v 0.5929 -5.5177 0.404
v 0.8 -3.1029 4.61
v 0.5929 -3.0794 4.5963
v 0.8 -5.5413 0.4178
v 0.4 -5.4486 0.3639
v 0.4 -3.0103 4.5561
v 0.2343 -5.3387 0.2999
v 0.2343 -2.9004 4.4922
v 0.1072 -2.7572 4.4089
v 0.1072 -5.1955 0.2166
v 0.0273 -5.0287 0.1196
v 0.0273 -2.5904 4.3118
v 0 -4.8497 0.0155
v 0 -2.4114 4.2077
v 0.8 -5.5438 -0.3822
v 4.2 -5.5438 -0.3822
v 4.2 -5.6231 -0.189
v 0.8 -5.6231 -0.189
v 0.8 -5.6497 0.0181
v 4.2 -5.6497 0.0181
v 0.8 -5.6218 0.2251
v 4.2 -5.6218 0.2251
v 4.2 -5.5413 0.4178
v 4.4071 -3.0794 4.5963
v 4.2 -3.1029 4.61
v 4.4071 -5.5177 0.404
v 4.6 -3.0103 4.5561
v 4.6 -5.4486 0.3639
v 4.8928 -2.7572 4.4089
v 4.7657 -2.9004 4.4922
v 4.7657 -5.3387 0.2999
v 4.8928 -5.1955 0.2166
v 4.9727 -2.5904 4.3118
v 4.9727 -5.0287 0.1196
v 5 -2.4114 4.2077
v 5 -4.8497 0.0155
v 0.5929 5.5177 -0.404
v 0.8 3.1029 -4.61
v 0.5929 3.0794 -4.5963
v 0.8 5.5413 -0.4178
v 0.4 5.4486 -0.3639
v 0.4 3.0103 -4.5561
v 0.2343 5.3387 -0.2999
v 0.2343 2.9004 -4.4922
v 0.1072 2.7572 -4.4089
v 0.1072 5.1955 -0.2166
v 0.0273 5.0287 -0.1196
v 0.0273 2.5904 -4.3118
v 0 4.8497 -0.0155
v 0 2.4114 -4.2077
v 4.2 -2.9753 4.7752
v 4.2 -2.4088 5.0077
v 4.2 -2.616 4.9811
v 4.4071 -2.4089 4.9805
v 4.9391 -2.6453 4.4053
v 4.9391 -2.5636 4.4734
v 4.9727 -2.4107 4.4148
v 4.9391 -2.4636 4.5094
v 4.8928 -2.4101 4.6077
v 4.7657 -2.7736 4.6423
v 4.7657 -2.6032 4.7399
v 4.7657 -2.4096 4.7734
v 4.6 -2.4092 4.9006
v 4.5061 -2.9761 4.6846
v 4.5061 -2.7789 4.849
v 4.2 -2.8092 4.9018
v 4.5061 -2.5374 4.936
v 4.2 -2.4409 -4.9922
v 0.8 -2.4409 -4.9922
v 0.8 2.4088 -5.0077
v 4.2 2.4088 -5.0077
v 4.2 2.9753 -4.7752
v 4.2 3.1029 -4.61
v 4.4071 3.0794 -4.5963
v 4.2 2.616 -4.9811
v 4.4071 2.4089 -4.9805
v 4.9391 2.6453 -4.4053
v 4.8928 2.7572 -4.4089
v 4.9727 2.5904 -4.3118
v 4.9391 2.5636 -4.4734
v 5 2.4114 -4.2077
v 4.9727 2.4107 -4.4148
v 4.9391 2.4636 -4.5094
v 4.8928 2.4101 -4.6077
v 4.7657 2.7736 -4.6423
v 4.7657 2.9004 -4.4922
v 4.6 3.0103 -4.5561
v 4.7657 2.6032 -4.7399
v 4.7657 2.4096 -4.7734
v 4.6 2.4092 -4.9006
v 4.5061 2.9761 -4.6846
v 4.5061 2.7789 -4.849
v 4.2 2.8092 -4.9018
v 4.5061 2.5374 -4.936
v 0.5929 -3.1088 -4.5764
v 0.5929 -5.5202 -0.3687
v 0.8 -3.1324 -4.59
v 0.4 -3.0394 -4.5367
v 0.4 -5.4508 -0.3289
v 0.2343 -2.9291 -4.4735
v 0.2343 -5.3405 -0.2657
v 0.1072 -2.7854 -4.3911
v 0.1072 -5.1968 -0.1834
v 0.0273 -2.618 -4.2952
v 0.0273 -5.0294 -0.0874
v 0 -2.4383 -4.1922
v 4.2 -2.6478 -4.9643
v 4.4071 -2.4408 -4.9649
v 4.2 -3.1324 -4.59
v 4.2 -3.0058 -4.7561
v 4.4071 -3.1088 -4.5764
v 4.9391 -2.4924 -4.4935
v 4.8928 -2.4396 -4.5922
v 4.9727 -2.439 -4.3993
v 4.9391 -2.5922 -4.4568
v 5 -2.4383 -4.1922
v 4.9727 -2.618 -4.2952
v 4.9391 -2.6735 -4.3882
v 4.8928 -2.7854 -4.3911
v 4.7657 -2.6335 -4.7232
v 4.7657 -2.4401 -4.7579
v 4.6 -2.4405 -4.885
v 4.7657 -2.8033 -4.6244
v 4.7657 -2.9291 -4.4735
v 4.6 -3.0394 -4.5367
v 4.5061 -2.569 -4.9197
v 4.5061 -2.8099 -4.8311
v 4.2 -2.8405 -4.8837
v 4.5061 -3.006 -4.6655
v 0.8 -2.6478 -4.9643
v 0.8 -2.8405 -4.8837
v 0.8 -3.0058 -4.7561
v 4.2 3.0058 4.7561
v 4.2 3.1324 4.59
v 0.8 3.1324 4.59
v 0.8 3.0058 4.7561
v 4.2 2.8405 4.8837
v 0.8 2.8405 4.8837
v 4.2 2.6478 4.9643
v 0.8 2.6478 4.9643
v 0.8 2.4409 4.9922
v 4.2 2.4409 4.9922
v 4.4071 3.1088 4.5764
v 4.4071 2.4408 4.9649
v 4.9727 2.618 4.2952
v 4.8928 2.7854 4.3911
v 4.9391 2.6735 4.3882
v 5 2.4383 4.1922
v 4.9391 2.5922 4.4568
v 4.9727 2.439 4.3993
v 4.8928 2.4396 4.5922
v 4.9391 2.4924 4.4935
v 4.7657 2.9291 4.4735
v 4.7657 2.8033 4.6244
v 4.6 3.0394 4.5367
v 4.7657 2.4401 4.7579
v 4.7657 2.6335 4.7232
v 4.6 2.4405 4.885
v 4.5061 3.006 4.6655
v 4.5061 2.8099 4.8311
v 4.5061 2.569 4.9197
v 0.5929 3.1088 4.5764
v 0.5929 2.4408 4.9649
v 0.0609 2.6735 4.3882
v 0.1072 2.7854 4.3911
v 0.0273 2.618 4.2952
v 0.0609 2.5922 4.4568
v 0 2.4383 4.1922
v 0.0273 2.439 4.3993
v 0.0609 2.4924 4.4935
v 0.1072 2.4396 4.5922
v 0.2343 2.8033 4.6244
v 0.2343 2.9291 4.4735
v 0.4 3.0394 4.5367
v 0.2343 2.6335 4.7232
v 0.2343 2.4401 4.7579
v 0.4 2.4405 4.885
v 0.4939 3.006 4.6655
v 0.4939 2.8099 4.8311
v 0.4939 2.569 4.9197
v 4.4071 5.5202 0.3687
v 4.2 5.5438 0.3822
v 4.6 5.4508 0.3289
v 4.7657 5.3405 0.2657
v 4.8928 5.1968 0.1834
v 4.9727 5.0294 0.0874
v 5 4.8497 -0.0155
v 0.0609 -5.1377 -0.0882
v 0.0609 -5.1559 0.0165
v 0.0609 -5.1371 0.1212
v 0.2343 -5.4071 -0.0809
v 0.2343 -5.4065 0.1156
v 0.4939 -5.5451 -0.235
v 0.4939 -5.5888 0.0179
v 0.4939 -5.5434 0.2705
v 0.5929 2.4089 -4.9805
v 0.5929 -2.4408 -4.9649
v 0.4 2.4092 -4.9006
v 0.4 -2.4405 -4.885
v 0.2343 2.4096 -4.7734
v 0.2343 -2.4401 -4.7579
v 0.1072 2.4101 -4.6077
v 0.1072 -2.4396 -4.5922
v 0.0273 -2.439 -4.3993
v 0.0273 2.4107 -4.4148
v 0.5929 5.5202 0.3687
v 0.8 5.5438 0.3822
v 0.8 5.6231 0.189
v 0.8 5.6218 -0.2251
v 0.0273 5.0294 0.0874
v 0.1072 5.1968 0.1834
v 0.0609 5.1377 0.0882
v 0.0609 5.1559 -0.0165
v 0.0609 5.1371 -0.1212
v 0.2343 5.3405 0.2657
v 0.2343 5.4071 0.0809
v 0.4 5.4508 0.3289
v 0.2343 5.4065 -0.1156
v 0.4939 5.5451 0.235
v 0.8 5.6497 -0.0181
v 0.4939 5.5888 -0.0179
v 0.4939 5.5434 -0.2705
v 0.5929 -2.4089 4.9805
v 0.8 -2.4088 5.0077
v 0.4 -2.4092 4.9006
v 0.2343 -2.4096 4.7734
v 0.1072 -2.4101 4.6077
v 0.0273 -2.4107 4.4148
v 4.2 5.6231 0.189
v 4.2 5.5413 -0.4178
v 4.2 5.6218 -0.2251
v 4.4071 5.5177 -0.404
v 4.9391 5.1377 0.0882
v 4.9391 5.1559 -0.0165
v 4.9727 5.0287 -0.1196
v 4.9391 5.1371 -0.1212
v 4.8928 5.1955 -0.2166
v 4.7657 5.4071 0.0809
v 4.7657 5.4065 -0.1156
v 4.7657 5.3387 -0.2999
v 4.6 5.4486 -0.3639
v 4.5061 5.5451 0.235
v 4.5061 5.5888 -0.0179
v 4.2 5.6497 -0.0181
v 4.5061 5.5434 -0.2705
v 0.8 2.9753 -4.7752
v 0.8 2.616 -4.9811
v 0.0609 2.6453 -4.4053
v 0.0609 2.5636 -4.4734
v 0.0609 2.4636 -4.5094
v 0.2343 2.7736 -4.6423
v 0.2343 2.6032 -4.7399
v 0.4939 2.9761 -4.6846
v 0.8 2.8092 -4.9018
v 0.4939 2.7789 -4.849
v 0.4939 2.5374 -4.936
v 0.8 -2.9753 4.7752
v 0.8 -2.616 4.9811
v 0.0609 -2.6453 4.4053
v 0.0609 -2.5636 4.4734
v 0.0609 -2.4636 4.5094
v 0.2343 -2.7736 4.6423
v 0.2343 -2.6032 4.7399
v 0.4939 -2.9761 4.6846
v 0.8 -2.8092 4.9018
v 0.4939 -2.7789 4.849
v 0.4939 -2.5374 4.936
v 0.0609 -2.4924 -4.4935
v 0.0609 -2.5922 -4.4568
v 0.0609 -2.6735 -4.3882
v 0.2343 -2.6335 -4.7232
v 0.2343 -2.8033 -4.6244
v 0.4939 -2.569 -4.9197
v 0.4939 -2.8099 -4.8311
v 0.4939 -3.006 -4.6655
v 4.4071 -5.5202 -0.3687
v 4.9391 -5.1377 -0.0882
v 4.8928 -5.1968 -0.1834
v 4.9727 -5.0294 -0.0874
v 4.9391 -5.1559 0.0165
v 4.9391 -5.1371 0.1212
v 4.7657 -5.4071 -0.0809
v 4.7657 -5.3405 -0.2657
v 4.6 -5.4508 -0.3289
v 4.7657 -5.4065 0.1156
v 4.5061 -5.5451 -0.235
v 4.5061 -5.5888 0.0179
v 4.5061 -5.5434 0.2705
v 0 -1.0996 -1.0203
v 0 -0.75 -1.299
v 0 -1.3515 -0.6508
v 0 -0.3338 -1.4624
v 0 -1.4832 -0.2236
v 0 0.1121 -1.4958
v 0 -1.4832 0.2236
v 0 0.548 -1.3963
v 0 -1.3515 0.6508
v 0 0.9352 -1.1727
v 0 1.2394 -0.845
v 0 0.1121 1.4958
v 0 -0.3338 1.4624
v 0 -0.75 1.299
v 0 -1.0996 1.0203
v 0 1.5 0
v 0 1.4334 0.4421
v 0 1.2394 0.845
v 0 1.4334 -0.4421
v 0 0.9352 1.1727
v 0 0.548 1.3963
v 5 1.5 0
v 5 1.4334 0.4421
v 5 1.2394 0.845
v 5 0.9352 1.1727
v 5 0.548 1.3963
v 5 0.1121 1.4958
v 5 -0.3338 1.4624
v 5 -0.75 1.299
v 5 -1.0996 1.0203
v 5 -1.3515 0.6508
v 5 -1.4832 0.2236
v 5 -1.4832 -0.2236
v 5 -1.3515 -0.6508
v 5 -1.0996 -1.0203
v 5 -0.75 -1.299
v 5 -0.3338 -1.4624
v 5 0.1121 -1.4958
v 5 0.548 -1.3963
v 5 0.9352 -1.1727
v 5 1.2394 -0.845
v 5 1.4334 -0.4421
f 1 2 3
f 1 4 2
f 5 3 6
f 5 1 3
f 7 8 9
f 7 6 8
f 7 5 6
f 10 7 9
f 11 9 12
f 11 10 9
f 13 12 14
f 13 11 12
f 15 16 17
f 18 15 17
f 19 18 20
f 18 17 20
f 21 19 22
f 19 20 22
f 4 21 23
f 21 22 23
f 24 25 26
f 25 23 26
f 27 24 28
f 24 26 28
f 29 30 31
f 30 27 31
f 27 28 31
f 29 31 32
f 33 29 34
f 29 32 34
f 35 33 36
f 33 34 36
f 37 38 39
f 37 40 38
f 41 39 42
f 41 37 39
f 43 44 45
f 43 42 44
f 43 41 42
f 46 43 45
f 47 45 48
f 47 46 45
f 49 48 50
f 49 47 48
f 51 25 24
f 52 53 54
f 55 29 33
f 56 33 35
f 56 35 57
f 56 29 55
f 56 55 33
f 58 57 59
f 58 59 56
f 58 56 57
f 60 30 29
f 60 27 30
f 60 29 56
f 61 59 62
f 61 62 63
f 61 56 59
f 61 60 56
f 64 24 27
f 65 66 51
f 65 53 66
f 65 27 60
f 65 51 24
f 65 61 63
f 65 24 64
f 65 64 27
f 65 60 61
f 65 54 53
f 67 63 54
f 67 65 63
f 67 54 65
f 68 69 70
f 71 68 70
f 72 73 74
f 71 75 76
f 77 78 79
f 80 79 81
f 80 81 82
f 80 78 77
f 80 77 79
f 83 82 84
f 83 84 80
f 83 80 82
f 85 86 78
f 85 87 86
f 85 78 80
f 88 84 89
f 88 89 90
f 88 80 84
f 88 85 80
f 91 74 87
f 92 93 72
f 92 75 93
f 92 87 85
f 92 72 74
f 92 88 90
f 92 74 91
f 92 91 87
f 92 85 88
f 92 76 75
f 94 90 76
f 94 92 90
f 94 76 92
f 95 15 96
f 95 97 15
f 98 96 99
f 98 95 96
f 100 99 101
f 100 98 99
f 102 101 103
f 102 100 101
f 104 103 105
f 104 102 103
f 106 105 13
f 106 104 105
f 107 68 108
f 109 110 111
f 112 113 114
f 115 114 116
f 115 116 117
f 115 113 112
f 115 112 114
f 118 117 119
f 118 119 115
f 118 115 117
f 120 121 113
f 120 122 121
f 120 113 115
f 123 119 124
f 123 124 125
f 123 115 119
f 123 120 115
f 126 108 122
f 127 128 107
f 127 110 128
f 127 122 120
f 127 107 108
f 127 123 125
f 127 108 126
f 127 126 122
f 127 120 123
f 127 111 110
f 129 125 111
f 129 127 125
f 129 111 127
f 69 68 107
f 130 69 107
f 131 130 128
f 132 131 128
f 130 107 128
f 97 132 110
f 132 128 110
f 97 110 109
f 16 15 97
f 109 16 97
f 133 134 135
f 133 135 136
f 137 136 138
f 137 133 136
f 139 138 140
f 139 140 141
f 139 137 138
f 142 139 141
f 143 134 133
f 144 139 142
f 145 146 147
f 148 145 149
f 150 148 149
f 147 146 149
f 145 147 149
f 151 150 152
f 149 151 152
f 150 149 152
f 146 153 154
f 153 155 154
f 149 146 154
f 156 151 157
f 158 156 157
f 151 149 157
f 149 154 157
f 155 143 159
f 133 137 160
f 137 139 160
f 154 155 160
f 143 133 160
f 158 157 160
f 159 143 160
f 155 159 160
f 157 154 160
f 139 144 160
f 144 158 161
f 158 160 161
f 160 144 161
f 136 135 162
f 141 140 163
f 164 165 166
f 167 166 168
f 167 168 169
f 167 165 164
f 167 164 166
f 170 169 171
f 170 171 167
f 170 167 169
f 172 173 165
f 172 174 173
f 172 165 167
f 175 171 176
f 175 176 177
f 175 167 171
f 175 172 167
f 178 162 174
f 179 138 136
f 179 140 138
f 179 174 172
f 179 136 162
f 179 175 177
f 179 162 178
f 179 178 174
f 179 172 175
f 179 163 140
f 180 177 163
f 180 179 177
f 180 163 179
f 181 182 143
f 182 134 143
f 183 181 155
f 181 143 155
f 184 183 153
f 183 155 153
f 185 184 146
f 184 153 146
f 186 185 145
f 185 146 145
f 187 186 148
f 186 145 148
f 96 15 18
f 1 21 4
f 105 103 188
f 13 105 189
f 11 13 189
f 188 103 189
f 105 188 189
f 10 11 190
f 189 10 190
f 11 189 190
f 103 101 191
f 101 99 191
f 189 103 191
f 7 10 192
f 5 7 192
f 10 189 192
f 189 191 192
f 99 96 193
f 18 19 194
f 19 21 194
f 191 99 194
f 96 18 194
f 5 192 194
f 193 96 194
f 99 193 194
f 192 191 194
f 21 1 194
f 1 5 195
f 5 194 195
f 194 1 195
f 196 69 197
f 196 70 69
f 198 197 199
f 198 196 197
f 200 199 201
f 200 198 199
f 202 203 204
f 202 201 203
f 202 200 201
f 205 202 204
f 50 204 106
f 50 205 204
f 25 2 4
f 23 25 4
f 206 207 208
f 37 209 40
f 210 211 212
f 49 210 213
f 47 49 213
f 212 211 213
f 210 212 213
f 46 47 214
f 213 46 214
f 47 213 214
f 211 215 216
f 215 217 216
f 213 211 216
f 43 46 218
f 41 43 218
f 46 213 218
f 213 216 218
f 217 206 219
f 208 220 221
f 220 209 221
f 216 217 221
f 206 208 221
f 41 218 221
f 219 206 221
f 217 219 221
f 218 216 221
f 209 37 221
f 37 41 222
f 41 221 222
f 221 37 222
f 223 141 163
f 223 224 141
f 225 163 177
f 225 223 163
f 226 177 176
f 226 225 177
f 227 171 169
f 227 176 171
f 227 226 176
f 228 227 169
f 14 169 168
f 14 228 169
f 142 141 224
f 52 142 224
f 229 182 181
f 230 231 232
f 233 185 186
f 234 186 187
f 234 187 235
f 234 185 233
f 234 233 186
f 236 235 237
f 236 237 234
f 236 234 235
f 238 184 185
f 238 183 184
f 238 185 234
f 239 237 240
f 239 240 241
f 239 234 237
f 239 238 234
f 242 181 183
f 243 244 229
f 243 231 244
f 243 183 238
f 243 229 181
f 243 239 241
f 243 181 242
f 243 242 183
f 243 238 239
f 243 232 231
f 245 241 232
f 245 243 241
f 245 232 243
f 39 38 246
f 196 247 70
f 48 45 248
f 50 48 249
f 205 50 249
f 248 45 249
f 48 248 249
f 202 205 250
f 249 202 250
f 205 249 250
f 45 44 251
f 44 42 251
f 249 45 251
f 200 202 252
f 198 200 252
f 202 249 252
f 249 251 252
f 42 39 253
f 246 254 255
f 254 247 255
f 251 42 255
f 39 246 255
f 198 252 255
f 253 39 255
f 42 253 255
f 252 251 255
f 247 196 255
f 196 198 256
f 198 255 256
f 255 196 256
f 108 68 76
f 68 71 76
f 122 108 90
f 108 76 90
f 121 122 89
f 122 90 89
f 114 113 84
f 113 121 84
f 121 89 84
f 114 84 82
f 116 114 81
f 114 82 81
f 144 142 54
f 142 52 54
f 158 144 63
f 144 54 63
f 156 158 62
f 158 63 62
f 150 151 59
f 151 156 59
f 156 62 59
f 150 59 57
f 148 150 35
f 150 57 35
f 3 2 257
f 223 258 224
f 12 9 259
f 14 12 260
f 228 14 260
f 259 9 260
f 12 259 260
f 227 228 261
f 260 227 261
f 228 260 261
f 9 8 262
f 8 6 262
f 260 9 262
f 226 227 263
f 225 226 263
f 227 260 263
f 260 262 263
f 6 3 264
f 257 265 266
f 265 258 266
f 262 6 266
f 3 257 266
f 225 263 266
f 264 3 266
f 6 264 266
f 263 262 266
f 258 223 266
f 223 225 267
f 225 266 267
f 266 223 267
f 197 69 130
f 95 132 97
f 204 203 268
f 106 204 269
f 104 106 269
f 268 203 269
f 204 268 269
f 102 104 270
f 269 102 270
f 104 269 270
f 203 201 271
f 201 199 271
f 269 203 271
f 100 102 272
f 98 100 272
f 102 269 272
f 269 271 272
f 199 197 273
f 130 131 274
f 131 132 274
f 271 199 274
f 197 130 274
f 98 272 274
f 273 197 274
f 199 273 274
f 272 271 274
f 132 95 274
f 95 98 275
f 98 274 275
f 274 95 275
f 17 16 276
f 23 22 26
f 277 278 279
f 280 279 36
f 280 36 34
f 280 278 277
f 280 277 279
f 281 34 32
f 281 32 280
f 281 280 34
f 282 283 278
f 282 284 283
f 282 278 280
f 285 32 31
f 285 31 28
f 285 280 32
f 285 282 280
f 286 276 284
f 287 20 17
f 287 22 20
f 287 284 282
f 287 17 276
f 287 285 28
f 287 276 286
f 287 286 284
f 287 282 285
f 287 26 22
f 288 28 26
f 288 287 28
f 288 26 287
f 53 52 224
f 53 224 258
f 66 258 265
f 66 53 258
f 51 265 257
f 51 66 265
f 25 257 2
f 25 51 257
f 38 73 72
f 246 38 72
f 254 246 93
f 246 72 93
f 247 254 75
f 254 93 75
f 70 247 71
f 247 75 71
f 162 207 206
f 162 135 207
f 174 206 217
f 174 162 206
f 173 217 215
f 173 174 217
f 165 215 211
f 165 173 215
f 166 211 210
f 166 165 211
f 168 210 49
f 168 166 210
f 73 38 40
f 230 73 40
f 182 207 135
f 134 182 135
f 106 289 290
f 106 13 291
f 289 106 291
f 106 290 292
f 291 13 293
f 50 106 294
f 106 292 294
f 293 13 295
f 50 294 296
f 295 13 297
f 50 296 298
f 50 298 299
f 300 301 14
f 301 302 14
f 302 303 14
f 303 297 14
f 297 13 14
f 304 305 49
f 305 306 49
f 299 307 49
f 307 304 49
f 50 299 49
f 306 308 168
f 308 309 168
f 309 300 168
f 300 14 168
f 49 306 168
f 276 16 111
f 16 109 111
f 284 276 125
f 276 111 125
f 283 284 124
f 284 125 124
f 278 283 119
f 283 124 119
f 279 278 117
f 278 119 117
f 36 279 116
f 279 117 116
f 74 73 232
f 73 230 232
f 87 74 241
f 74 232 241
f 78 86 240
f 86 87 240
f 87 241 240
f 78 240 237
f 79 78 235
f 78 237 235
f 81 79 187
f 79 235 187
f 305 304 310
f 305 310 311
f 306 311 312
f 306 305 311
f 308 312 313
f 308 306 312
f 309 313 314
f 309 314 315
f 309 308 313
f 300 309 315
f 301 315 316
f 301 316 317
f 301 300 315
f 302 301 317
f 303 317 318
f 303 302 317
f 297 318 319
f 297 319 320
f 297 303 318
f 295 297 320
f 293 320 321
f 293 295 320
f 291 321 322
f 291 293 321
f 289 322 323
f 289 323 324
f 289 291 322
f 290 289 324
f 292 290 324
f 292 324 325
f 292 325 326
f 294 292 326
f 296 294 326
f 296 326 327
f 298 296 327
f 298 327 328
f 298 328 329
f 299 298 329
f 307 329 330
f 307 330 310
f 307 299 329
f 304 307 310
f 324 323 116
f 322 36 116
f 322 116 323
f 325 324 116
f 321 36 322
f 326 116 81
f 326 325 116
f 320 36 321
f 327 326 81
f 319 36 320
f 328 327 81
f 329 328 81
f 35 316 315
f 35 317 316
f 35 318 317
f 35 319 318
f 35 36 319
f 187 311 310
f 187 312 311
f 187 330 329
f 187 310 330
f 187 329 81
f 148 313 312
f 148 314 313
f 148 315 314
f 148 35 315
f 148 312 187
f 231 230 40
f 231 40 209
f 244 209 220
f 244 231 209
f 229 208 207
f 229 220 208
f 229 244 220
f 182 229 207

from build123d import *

# Parameters (mm, degrees)
F0_R     = 1.5
F1_DEPTH = 5
F2_R     = 0.8


with BuildPart() as f1:
    # F0 (on Right) → F1 (new body)
    with BuildSketch(Plane.YZ):
        Polygon((2.870718, -5.009223), (5.773473, -0.018497), (2.902755, 4.990726), (-2.870718, 5.009223), (-5.773473, 0.018497), (-2.902755, -4.990726), align=None)
        Circle(F0_R, mode=Mode.SUBTRACT)
    extrude(amount=F1_DEPTH)

    # F2
    f2_edges = [f1.edges().sort_by_distance(p)[0] for p in [
        (2.5, -2.870718, 5.009223),
        (2.5, 2.902755, 4.990726),
        (2.5, -5.773473, 0.018497),
        (2.5, -2.902755, -4.990726),
        (2.5, 2.870718, -5.009223),
        (2.5, 5.773473, -0.018497),
        (5, 4.338114, 2.486115),
        (0, 4.338114, 2.486115),
        (5, 4.322096, -2.51386),
        (0, 4.322096, -2.51386),
        (5, -0.016019, -4.999974),
        (0, -0.016019, -4.999974),
        (5, -4.338114, -2.486115),
        (0, -4.338114, -2.486115),
        (5, -4.322096, 2.51386),
        (0, -4.322096, 2.51386),
        (0, 0.016019, 4.999974),
        (5, 0.016019, 4.999974),
    ]]
    fillet(f2_edges, radius=F2_R)


solid = f1.part
